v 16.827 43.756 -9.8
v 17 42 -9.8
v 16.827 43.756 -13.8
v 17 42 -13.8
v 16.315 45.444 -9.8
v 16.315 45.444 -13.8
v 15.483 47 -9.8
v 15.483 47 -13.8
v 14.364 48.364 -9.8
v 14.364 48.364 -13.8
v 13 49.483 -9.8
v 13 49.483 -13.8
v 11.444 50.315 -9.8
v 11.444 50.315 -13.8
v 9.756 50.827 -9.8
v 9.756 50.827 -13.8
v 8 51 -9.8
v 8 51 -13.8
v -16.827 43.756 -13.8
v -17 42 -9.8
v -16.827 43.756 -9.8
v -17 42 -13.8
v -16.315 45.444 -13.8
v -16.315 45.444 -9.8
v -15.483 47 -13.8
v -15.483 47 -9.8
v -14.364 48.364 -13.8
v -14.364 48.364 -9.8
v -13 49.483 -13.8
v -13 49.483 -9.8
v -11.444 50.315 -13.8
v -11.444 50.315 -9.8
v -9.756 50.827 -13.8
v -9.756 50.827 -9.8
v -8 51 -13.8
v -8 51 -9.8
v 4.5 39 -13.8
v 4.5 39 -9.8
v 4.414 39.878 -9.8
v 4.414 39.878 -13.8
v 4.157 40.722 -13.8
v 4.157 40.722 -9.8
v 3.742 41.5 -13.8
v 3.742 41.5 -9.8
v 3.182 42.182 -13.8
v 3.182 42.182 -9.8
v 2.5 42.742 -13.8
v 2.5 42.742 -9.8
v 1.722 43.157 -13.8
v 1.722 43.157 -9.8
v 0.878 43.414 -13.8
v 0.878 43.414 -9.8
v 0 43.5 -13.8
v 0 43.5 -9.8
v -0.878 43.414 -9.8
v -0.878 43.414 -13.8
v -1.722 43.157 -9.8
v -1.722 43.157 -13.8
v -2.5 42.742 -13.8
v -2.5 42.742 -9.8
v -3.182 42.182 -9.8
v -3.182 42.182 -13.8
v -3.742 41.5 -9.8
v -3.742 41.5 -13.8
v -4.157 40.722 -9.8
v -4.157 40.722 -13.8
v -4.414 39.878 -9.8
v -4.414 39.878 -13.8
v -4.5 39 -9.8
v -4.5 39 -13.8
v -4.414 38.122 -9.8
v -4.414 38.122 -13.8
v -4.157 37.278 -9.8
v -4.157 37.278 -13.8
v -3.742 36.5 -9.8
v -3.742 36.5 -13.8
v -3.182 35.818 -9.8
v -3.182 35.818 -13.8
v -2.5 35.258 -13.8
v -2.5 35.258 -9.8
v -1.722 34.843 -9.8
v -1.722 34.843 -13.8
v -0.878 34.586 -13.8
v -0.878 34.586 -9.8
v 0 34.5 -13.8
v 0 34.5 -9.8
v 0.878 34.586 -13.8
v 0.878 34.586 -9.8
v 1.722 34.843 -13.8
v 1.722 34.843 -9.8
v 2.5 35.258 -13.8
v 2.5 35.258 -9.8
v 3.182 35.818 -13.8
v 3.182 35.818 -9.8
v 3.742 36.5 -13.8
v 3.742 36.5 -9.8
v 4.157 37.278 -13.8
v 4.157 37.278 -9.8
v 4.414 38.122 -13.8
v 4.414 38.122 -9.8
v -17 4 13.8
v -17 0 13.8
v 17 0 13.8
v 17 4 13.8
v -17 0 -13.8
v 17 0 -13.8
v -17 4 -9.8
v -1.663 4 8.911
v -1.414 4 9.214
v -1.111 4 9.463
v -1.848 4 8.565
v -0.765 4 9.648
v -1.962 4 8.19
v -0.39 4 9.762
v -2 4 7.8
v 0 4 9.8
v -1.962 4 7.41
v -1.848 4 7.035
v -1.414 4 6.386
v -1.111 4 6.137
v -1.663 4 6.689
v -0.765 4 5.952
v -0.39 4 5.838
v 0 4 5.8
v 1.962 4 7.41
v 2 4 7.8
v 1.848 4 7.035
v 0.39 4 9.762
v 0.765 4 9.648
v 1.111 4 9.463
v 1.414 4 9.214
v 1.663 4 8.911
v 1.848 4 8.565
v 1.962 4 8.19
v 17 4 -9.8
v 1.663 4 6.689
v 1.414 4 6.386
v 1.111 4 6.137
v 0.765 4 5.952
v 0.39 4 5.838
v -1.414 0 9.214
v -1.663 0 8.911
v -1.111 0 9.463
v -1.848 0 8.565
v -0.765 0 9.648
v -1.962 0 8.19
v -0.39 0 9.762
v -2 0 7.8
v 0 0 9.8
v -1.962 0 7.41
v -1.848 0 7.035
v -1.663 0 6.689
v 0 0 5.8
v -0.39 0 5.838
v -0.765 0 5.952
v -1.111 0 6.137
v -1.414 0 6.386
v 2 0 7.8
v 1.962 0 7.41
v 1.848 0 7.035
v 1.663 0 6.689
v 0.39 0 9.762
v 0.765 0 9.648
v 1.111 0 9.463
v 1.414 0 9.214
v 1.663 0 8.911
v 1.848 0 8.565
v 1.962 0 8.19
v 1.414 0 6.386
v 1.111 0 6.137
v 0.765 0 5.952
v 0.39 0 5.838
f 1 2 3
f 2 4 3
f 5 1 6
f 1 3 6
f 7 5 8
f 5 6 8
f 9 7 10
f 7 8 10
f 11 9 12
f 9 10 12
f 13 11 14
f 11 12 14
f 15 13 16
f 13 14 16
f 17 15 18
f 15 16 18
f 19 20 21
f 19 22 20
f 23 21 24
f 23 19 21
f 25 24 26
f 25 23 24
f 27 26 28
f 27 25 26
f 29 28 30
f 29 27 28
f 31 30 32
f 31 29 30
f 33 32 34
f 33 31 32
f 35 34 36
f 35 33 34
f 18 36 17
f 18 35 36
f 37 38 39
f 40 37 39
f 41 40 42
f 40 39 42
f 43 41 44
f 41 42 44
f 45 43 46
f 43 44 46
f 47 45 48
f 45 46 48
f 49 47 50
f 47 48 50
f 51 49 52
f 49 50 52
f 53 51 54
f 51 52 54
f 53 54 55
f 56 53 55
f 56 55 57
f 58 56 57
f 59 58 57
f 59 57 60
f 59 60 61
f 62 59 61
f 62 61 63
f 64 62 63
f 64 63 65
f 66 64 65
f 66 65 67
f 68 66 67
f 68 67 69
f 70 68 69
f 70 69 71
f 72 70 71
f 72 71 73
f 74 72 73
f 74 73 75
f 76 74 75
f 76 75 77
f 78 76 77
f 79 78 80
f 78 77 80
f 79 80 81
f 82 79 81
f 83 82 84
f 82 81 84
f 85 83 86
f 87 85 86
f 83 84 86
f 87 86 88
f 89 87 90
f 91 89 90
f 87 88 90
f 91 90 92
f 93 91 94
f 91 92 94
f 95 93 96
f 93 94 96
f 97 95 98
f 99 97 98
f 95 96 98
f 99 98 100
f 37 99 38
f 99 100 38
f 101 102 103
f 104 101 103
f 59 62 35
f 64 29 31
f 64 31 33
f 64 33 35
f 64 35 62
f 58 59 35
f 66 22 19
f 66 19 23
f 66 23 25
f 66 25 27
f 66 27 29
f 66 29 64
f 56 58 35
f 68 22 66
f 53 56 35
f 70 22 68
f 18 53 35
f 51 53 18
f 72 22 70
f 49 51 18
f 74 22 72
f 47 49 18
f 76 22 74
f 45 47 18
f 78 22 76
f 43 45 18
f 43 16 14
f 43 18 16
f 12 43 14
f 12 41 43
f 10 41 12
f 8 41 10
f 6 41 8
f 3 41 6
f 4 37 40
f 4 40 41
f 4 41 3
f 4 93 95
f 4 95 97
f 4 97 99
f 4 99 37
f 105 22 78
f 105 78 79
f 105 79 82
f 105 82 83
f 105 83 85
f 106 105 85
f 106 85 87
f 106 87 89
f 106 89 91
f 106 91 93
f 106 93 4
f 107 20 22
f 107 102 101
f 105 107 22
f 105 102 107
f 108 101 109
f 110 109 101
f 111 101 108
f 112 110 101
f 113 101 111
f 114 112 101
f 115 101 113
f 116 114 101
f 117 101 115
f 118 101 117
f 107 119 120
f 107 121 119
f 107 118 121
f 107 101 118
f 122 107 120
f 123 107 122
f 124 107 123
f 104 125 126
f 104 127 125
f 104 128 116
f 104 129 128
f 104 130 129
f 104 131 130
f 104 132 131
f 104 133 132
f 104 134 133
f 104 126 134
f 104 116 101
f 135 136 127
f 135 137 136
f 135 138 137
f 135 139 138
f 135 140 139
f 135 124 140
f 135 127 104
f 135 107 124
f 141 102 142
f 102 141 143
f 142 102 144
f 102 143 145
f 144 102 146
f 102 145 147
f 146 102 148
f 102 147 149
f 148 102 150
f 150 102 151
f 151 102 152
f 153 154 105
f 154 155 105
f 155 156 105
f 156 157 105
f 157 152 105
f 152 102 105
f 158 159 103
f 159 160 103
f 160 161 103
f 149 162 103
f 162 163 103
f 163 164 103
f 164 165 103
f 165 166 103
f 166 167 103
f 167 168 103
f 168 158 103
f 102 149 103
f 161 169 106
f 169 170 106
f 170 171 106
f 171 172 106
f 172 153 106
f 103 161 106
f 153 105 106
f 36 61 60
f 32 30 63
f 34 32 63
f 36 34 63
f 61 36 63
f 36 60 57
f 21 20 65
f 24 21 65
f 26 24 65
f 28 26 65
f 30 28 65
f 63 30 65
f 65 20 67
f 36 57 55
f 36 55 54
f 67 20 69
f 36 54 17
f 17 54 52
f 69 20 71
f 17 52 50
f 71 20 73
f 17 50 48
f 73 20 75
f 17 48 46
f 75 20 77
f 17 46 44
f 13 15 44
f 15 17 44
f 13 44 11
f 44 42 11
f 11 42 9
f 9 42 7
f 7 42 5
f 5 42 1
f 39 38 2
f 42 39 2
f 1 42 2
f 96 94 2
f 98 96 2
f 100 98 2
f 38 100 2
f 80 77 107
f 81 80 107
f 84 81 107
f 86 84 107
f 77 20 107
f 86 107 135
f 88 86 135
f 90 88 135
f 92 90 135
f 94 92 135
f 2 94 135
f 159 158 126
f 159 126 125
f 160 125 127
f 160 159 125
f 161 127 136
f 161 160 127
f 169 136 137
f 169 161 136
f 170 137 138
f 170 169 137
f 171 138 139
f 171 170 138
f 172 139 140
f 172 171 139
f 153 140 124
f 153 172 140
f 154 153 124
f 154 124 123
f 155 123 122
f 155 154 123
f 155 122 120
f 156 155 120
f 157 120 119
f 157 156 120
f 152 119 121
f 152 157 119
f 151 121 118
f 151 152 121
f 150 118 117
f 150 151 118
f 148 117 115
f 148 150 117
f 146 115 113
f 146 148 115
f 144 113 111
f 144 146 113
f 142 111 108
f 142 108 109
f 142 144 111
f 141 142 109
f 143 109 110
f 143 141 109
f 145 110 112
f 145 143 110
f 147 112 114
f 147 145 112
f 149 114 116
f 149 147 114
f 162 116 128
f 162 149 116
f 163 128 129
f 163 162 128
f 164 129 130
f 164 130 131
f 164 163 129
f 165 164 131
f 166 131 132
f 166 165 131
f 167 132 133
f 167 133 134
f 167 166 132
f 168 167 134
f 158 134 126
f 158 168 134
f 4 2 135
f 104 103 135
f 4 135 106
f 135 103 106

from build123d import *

# Parameters (mm, degrees)
SKETCH2_W           = 34
SKETCH2_H           = 27.6
SKETCH2_R           = 2
BOSS_EXTRUDE1_DEPTH = 4
SKETCH3_W           = 34
SKETCH3_H           = 4
BOSS_EXTRUDE2_DEPTH = 47
FILLET1_R           = 9
SKETCH4_R           = 4.5
CUT_EXTRUDE1_DEPTH  = 5


with BuildPart() as part:
    # Sketch2 → Boss-Extrude1 (new body)
    with BuildSketch(Plane(origin=(0, 0, 0), x_dir=(1, 0, 0), z_dir=(0, 1, 0))):
        Rectangle(SKETCH2_W, SKETCH2_H)
        with Locations((0, -7.8)):
            Circle(SKETCH2_R, mode=Mode.SUBTRACT)
    extrude(amount=BOSS_EXTRUDE1_DEPTH)

    # Sketch3 → Boss-Extrude2 (add)
    with BuildSketch(Plane(origin=(0, 4, 0), x_dir=(1, 0, 0), z_dir=(0, 1, 0))):
        with Locations((0, 11.8)):
            Rectangle(SKETCH3_W, SKETCH3_H)
    extrude(amount=BOSS_EXTRUDE2_DEPTH)

    # Fillet1
    fillet1_edges = [part.edges().sort_by_distance(p)[0] for p in [
        (-17, 51, -11.8),
        (17, 51, -11.8),
    ]]
    fillet(fillet1_edges, radius=FILLET1_R)

    # Sketch4 → Cut-Extrude1 (cut, through all)
    with BuildSketch(Plane.XY.offset(-9.8)):
        with Locations((0, 39)):
            Circle(SKETCH4_R)
    extrude(amount=-CUT_EXTRUDE1_DEPTH, mode=Mode.SUBTRACT)


solid = part.part
